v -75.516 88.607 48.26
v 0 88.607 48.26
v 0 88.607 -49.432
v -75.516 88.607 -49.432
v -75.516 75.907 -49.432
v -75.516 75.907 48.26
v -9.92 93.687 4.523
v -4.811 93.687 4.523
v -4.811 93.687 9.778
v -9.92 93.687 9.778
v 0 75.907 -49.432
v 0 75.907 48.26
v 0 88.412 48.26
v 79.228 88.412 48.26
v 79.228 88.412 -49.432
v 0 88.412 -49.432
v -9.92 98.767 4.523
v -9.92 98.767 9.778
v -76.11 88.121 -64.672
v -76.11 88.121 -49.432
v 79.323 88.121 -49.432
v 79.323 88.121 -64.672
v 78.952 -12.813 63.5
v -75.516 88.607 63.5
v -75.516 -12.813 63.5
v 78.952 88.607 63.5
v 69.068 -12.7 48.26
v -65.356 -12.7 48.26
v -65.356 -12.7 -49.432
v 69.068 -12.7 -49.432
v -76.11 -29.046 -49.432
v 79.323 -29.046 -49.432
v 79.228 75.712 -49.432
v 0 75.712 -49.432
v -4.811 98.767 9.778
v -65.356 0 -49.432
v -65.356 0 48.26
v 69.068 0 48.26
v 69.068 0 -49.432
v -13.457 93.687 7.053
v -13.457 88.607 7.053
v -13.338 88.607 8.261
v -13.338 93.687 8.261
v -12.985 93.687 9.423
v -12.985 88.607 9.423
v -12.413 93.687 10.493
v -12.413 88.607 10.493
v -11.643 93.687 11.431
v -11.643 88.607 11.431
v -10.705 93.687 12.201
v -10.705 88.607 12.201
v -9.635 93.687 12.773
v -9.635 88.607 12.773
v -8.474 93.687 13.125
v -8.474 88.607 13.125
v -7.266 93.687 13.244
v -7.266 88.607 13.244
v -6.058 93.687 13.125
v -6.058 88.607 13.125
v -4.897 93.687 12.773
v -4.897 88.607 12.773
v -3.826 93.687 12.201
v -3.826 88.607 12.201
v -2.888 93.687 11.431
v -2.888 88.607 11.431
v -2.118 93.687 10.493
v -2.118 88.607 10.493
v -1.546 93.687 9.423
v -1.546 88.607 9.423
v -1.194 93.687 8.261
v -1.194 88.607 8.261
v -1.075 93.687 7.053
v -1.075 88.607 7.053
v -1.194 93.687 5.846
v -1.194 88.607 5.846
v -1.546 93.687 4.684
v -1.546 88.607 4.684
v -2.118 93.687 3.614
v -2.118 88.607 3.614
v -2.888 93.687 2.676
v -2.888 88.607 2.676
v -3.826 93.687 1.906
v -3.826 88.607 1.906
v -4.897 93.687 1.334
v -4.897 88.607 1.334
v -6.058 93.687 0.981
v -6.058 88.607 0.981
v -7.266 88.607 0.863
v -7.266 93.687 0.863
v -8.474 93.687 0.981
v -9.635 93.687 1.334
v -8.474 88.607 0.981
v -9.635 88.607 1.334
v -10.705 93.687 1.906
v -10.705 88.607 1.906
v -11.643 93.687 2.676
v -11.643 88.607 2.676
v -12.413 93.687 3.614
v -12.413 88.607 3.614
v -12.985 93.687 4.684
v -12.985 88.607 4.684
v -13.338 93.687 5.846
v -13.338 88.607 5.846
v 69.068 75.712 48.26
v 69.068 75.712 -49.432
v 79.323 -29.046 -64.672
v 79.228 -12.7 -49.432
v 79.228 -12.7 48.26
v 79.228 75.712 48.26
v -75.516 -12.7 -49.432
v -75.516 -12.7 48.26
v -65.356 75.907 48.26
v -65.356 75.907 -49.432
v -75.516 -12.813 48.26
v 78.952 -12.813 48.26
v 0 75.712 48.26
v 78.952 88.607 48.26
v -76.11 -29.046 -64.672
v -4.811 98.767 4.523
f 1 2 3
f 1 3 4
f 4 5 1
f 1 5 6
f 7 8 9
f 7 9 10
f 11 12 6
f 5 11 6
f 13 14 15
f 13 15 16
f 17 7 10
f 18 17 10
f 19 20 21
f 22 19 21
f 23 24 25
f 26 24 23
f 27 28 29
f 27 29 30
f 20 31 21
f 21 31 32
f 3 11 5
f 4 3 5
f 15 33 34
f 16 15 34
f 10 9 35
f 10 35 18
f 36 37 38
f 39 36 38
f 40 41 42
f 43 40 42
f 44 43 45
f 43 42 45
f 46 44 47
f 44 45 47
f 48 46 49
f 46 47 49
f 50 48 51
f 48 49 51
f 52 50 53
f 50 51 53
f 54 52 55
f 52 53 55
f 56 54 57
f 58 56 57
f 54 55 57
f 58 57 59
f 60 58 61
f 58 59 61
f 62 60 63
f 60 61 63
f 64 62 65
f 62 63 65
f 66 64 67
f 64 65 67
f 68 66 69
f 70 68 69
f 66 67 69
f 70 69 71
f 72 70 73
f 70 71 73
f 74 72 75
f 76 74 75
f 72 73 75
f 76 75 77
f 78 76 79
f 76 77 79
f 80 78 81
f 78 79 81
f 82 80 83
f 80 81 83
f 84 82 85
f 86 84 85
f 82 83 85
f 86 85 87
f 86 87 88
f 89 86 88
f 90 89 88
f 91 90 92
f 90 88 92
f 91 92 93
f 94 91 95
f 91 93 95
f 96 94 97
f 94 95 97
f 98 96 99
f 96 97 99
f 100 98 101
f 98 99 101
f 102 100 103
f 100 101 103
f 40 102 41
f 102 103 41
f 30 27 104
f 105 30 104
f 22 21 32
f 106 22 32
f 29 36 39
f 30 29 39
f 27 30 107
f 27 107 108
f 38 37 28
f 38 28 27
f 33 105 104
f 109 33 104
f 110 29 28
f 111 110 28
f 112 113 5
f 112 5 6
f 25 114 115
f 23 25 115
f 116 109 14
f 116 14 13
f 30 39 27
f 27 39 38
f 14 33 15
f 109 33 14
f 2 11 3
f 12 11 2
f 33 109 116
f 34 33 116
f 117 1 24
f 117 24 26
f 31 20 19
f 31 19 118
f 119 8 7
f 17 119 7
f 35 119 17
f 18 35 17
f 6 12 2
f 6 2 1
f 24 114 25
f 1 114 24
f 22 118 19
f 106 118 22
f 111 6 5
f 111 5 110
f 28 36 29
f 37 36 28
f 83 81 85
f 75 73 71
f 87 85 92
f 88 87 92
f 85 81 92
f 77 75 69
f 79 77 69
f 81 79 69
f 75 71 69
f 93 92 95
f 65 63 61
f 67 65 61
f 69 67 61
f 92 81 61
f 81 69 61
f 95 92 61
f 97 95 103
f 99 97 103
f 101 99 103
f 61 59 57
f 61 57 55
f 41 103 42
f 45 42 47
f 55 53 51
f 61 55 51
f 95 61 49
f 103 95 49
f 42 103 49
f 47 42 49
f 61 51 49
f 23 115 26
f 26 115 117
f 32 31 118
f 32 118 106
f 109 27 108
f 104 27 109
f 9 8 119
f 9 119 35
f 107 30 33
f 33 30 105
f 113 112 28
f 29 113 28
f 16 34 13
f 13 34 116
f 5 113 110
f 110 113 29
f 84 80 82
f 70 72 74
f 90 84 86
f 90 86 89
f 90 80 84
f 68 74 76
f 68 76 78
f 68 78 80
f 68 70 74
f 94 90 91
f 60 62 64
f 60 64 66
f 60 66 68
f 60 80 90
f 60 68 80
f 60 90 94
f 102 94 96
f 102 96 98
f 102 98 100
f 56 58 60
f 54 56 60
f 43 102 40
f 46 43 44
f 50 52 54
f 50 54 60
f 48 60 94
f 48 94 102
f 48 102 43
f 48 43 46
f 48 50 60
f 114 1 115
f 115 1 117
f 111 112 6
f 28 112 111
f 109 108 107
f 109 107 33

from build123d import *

# Parameters (mm, degrees)
F0_W      = 134.42462
F0_H      = 97.692314
F1_DEPTH  = 12.7
F2_W      = 88.411541
F2_H      = 97.692314
F3_DEPTH  = 10.16
F4_W      = 88.606925
F4_H      = 97.692314
F5_DEPTH  = 10.16
F6_W      = 79.228462
F6_H      = 97.692314
F7_DEPTH  = 12.7
F8_W      = 75.516158
F8_H      = 97.692314
F9_DEPTH  = 12.7
F10_W     = 154.468515
F10_H     = 101.419647
F11_DEPTH = 15.24
F13_W     = 155.432985
F13_H     = 117.166555
F14_DEPTH = 15.24
F15_R     = 6.190849
F16_DEPTH = 5.08
F17_W     = 5.108219
F17_H     = 5.255047
F18_DEPTH = 5.08


with BuildPart() as f1:
    # F0 (on Front) → F1 (new body)
    with BuildSketch(Plane.XZ):
        with Locations((1.856152, -0.586154)):
            Rectangle(F0_W, F0_H)
    extrude(amount=F1_DEPTH)


with BuildPart() as f3:
    # F2 (on face) → F3 (new body)
    with BuildSketch(Plane.YZ.offset(69.068462)):
        with Locations((31.50577, -0.586154)):
            Rectangle(F2_W, F2_H)
    extrude(amount=F3_DEPTH)


with BuildPart() as f5:
    # F4 (on face) → F5 (new body)
    with BuildSketch(Plane(origin=(-65.356158, 0, 0), x_dir=(0, -1, 0), z_dir=(-1, 0, 0))):
        with Locations((-31.603462, -0.586154)):
            Rectangle(F4_W, F4_H)
    extrude(amount=F5_DEPTH)


with BuildPart() as f7:
    # F6 (on face) → F7 (new body)
    with BuildSketch(Plane(origin=(0, 75.711541, 0), x_dir=(-1, 0, 0), z_dir=(0, 1, 0))):
        with Locations((-39.614231, -0.586154)):
            Rectangle(F6_W, F6_H)
    extrude(amount=F7_DEPTH)


with BuildPart() as f9:
    # F8 (on face) → F9 (new body)
    with BuildSketch(Plane(origin=(0, 75.906925, 0), x_dir=(-1, 0, 0), z_dir=(0, 1, 0))):
        with Locations((37.758079, -0.586154)):
            Rectangle(F8_W, F8_H)
    extrude(amount=F9_DEPTH)


with BuildPart() as f11:
    # F10 (on face) → F11 (new body)
    with BuildSketch(Plane.XY.offset(48.260003)):
        with Locations((1.7181, 37.897101)):
            Rectangle(F10_W, F10_H)
    extrude(amount=F11_DEPTH)


with BuildPart() as f14:
    # F13 (on face) → F14 (new body)
    with BuildSketch(Plane(origin=(0, 0, -49.432311), x_dir=(1, 0, 0), z_dir=(0, 0, -1))):
        with Locations((1.606234, -29.537548)):
            Rectangle(F13_W, F13_H)
    extrude(amount=F14_DEPTH)


with BuildPart() as f16:
    # F15 (on face) → F16 (new body)
    with BuildSketch(Plane(origin=(0, 88.606925, 0), x_dir=(-1, 0, 0), z_dir=(0, 1, 0))):
        with Locations((7.265798, 7.053389)):
            Circle(F15_R)
    extrude(amount=F16_DEPTH)


with BuildPart() as f18:
    # F17 (on face) → F18 (new body)
    with BuildSketch(Plane(origin=(0, 93.686925, 0), x_dir=(-1, 0, 0), z_dir=(0, 1, 0))):
        with Locations((7.365423, 7.150276)):
            Rectangle(F17_W, F17_H)
    extrude(amount=F18_DEPTH)


solid = Compound([f1.part, f3.part, f5.part, f7.part, f9.part, f11.part, f14.part, f16.part, f18.part])
